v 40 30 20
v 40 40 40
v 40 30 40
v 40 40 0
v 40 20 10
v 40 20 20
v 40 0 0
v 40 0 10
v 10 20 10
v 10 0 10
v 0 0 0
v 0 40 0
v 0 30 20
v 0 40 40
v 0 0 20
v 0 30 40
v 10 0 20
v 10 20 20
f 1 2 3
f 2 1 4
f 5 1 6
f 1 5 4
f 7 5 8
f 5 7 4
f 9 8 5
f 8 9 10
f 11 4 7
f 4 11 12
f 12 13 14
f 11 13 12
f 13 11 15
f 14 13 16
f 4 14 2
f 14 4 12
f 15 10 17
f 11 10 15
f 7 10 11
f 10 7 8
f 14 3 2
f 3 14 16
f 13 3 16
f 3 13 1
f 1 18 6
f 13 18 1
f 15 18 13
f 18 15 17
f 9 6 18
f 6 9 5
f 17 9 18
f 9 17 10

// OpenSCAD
cube([40,40,10]);
translate([0,30,0])
cube([40,10,40]);
translate([0,20,0])
cube([40,10,20]);
translate([0,0,0])
cube([10,40,20]);
